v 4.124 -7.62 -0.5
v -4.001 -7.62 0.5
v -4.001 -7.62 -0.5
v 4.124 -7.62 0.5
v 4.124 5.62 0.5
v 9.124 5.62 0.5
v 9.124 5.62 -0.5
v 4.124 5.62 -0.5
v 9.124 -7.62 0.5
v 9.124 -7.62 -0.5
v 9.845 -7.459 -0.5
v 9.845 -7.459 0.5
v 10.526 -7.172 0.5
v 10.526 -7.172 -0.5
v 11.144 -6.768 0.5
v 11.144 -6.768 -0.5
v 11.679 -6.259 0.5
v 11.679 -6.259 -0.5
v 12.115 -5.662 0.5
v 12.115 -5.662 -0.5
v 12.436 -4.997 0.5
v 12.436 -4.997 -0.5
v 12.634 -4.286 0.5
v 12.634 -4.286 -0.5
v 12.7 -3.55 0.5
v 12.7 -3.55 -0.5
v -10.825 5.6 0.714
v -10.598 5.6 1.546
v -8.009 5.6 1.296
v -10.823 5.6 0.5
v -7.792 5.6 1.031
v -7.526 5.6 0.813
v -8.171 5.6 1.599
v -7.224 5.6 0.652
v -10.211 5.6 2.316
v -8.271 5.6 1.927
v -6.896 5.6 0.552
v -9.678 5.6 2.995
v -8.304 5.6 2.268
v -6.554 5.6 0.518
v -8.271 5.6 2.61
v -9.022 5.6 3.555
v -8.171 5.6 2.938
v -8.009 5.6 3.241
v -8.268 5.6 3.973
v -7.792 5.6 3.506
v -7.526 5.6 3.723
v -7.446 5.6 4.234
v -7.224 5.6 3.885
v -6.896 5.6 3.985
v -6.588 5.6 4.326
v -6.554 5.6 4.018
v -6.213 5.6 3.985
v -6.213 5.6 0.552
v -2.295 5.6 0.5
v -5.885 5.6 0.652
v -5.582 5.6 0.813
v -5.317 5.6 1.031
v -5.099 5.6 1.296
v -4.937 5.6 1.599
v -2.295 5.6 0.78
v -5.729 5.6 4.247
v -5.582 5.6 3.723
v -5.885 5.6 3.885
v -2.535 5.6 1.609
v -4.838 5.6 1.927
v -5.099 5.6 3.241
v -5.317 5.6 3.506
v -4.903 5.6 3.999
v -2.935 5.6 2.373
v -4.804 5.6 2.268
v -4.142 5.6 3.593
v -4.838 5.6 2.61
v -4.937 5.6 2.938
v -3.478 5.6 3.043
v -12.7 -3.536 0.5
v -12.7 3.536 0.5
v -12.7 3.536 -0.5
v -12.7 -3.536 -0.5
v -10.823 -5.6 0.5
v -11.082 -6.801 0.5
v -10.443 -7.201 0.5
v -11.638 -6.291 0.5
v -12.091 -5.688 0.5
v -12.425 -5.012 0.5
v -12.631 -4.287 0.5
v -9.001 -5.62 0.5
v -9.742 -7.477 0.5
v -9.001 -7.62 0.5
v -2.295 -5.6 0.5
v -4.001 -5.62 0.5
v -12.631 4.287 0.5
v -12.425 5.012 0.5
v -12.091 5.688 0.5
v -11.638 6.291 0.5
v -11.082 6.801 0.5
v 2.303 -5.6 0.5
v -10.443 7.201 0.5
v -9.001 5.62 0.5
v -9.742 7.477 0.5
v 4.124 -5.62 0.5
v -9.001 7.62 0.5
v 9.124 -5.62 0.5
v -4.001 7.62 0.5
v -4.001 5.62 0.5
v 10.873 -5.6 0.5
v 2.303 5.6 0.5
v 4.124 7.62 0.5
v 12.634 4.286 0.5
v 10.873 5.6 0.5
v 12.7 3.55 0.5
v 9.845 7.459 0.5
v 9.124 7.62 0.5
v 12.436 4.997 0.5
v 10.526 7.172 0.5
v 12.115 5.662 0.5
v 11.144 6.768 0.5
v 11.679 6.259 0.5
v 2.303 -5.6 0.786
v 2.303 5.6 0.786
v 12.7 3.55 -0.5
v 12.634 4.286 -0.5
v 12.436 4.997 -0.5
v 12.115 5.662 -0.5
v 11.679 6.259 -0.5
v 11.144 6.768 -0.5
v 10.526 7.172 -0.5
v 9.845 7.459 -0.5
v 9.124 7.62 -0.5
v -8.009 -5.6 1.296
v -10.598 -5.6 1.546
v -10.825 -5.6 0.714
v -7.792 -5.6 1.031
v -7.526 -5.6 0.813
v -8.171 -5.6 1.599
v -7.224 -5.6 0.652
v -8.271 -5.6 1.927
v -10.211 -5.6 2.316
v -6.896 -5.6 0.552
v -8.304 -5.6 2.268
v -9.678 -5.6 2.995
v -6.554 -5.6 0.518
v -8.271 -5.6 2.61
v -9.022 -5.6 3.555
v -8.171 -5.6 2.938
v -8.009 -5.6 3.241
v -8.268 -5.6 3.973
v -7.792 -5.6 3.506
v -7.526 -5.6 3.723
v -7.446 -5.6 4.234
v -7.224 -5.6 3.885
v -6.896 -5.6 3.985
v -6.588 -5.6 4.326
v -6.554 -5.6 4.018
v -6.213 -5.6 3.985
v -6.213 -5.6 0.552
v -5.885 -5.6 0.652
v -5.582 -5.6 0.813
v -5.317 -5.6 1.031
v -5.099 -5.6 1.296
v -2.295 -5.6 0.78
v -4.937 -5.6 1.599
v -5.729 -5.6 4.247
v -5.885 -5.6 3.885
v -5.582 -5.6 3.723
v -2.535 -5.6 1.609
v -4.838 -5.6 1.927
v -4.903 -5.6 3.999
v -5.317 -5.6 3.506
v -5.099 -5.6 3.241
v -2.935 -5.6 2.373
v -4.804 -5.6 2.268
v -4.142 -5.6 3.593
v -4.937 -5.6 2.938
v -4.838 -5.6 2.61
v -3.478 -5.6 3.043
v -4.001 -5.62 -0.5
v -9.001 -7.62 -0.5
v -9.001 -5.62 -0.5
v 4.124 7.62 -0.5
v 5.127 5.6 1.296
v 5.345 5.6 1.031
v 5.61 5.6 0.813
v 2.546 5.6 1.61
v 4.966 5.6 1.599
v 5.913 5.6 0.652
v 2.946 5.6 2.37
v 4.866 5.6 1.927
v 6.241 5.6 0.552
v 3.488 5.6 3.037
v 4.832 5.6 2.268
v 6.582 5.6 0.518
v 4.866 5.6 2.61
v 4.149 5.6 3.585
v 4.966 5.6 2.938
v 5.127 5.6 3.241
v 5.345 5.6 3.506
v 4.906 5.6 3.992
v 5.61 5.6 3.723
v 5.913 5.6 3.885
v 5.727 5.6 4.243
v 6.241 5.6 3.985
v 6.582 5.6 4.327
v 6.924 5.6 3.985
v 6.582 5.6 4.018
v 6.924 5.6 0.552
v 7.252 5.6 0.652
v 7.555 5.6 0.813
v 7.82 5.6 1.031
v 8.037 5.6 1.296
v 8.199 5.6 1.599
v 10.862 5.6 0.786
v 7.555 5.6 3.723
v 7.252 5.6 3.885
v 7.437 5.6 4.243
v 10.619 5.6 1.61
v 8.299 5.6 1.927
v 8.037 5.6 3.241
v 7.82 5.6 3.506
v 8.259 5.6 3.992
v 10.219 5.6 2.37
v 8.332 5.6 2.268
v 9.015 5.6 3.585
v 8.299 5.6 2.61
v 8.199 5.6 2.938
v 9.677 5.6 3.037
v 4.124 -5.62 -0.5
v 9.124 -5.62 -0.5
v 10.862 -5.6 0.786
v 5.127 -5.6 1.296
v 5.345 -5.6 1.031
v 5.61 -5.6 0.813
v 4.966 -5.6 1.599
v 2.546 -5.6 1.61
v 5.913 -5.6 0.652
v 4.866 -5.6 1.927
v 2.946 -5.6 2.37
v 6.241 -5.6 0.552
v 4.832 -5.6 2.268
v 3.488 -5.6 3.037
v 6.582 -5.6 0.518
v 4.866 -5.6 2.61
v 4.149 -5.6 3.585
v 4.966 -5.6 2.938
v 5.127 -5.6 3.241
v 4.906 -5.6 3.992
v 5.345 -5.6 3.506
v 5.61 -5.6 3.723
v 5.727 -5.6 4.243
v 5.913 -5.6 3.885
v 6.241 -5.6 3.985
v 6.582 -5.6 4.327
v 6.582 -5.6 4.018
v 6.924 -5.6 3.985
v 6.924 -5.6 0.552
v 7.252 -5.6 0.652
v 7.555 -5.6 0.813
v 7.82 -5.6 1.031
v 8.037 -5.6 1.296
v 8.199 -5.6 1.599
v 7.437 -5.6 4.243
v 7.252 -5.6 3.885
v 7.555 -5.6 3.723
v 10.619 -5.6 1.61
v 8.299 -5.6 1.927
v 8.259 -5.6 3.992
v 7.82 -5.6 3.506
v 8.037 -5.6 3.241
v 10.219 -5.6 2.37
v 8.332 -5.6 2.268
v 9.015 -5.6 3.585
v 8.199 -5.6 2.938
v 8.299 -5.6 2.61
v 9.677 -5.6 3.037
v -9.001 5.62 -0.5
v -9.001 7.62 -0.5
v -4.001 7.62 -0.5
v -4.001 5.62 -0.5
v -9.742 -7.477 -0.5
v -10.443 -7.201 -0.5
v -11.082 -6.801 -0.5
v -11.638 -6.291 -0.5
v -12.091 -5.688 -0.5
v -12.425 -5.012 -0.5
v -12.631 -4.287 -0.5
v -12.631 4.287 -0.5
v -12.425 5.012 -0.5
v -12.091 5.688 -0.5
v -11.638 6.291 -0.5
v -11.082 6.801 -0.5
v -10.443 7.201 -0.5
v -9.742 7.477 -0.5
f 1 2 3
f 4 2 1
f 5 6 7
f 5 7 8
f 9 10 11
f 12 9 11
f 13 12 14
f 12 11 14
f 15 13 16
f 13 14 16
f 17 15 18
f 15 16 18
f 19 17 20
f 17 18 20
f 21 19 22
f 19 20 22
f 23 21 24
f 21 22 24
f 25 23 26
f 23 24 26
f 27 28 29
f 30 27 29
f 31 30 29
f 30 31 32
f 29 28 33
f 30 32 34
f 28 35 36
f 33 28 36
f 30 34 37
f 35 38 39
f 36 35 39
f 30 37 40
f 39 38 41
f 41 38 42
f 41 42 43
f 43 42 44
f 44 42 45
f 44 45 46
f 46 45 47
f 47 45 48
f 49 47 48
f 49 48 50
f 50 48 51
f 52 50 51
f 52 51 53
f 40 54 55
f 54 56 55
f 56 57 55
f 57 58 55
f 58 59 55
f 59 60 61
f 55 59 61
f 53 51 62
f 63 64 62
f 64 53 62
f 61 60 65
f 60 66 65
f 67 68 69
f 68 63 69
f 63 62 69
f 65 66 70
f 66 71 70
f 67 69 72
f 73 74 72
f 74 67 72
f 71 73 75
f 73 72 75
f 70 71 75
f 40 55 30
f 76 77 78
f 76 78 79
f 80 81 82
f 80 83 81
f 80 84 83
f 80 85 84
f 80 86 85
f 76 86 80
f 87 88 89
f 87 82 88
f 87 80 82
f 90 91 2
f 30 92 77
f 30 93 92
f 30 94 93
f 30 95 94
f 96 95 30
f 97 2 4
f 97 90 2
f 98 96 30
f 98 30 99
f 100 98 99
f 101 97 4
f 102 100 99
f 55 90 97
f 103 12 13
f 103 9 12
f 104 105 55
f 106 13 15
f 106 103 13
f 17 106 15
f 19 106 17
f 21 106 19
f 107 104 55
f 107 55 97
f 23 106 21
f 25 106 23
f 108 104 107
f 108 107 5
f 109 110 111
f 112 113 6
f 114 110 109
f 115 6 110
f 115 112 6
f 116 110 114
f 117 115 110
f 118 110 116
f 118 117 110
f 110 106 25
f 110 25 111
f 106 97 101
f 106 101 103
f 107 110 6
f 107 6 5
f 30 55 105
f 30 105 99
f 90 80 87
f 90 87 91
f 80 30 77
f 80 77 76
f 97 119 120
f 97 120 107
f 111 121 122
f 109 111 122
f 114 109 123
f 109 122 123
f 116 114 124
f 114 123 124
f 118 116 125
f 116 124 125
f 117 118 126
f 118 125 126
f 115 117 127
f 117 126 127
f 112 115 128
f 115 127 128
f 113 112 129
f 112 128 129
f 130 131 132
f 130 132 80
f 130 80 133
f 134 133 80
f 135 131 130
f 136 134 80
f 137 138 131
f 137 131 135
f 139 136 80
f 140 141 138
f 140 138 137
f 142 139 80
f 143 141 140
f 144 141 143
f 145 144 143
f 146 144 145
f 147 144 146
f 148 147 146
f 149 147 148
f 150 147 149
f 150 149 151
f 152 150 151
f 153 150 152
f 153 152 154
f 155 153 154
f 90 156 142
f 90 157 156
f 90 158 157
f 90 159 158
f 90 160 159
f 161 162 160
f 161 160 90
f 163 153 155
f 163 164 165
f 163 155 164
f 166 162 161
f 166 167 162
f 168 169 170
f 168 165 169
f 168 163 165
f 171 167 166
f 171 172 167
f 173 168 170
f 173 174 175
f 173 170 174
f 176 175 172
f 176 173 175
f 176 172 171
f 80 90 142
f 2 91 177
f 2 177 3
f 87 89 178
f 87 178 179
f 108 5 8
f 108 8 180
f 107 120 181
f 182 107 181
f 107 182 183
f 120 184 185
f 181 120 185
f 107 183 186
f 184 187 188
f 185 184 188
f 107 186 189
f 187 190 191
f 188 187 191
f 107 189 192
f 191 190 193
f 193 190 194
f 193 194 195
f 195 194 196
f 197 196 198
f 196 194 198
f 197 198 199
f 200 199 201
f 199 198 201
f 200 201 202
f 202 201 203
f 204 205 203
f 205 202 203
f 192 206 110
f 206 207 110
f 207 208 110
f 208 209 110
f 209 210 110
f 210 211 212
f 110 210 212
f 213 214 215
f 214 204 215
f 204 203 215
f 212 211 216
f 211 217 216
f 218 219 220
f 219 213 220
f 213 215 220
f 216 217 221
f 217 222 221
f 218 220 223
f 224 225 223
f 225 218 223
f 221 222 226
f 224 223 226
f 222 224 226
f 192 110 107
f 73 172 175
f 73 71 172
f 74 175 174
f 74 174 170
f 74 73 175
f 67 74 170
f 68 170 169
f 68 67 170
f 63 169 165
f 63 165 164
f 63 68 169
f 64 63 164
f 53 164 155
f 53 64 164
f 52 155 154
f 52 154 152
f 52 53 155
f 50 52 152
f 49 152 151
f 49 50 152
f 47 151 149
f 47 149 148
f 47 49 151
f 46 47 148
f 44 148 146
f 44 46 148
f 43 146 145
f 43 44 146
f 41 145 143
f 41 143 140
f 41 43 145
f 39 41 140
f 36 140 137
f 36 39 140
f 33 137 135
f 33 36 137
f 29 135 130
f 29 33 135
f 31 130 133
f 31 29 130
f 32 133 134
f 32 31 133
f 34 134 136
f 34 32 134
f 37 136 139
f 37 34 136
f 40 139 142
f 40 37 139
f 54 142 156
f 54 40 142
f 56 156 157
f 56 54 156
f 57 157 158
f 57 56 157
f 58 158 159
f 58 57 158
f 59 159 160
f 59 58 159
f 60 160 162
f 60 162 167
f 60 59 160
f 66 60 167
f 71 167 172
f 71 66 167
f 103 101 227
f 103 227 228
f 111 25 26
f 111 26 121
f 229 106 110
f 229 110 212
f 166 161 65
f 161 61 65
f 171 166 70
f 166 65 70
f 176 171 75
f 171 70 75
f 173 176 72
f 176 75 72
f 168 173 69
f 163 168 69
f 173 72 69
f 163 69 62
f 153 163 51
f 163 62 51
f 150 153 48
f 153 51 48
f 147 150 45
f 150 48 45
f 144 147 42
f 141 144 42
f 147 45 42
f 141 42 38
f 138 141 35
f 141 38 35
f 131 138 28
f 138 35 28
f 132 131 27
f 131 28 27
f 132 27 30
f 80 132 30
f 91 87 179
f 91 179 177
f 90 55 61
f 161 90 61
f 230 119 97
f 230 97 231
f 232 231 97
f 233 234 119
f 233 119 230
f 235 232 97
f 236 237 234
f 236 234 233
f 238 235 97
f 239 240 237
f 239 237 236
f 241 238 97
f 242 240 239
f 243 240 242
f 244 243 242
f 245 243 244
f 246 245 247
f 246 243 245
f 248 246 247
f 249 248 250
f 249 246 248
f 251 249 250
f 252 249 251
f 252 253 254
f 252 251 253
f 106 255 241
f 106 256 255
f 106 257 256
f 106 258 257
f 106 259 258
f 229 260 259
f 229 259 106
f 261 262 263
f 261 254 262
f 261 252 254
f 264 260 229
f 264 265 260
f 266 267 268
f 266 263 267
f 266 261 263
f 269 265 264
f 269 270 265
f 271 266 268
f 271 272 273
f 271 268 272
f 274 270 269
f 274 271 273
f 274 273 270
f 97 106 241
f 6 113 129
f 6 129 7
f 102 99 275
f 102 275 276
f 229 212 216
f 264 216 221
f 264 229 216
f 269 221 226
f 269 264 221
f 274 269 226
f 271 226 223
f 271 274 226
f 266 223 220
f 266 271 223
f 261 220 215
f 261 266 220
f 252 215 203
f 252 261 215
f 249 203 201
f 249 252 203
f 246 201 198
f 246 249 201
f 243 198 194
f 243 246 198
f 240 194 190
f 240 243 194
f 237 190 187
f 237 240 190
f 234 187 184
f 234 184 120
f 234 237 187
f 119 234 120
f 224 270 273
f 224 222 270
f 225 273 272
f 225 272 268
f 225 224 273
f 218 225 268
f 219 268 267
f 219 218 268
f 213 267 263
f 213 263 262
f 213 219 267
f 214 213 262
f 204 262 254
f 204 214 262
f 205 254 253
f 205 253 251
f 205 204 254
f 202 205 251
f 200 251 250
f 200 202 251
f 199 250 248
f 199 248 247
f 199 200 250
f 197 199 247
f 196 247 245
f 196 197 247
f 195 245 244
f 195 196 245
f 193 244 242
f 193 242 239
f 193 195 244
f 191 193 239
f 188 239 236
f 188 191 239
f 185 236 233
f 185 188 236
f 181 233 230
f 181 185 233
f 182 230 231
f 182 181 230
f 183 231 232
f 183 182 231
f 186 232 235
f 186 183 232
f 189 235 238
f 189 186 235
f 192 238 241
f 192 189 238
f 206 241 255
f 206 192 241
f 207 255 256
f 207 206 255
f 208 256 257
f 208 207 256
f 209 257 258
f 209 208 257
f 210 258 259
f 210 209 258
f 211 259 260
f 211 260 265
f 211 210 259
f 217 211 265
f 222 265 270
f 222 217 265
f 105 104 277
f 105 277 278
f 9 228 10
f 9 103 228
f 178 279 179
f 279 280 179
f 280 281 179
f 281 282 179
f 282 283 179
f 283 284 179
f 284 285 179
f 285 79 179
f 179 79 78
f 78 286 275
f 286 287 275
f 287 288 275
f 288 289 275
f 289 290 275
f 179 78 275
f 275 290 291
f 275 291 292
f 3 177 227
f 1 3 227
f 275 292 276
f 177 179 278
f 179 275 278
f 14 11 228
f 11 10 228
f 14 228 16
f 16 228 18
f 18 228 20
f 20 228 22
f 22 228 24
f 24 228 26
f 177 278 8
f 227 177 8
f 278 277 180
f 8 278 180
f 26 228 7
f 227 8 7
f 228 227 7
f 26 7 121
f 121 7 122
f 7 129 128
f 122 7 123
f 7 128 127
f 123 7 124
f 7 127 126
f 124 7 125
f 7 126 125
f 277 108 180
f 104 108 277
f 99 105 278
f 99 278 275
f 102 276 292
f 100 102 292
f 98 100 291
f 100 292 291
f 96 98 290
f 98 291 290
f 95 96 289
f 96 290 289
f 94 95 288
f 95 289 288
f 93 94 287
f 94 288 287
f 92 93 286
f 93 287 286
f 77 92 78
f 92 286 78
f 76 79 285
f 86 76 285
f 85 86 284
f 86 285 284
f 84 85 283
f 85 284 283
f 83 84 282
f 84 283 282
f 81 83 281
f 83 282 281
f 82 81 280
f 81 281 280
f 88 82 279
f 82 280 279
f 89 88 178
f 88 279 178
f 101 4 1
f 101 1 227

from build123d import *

# Parameters (mm, degrees)
F1_DEPTH    = 0.5
F2_R        = 1.75
F3_DEPTH    = 5.6
F4_T1_DEPTH = 21.3501190522
F4_T3_DEPTH = 21.4204938405


# Not quite as in the source:
# - a fillet or chamfer that OpenCascade refuses, or shapes differently, is made with other operations: its cross-section is extruded or revolved along the edge and cut away or added


with BuildPart() as f1:
    # F0 (on Top) → F1 (new body, symmetric)
    with BuildSketch(Plane.XY):
        Polygon((12.7, -7.62), (12.7, 7.62), (9.1240987852, 7.62), (9.1240987852, 5.62), (4.1240987852, 5.62), (4.1240987852, 7.62), (-4.0011659991, 7.62), (-4.0011659991, 5.62), (-9.0011659991, 5.62), (-9.0011659991, 7.62), (-12.7, 7.62), (-12.7, -7.62), (-9.0011659991, -7.62), (-9.0011659991, -5.62), (-4.0011659991, -5.62), (-4.0011659991, -7.62), (4.1240987852, -7.62), (4.1240987852, -5.62), (9.1240987852, -5.62), (9.1240987852, -7.62), align=None)
    extrude(amount=F1_DEPTH, both=True)

    # F2 (on Front) → F3 (join, symmetric)
    with BuildSketch(Plane.XZ):
        with BuildLine():
            Line((-2.2954130392, -0.004001643), (-2.2954130392, 0.7802180896))
            ThreePointArc((-2.2954130392, 0.7802180896), (-6.588071973, 4.326288954), (-10.8247913043, 0.7135685656))
            Line((-10.8247913043, 0.7135685656), (-10.8191841297, -0.004001643))
            Line((-10.8191841297, -0.004001643), (-6.5542345937, -0.004001643))
            Line((-6.5542345937, -0.004001643), (-2.2954130392, -0.004001643))
        make_face()
        with Locations((-6.5542345937, 2.2683413699)):
            Circle(F2_R, mode=Mode.SUBTRACT)
        with BuildLine():
            Line((10.8930142596, 0), (10.861883565, 0.7857921351))
            ThreePointArc((10.861883565, 0.7857921351), (6.5823484291, 4.3273176658), (2.3028132932, 0.7857921351))
            Line((2.3028132932, 0.7857921351), (2.3028132932, 0))
            Line((2.3028132932, 0), (10.8930142596, 0))
        make_face()
        with Locations((6.5823484291, 2.2683413699)):
            Circle(F2_R, mode=Mode.SUBTRACT)
    extrude(amount=F3_DEPTH, both=True)

    # F4: fillet of radius 4.104163056 on 4 edges, made by hand

    # F4_s2 → F4_t1 (cut)
    with BuildSketch(Plane.XY.offset(-10.6750595261)):
        with BuildLine():
            ThreePointArc((9.1240987852, -7.62), (11.6790355366, -6.2588580306), (12.7, -3.5499761896))
            Line((12.7, -3.5499761896), (12.7, -7.62))
            Line((12.7, -7.62), (9.1240987852, -7.62))
        make_face()
        with BuildLine():
            ThreePointArc((12.7, 3.5499761896), (11.6790355366, 6.2588580306), (9.1240987852, 7.62))
            Line((9.1240987852, 7.62), (12.7, 7.62))
            Line((12.7, 7.62), (12.7, 3.5499761896))
        make_face()
    extrude(amount=F4_T1_DEPTH, mode=Mode.SUBTRACT)

    # F4_s4 → F4_t3 (cut)
    with BuildSketch(Plane.XY.offset(-10.7102469202)):
        with BuildLine():
            ThreePointArc((-9.0011659991, 7.62), (-11.6378503335, 6.2909527611), (-12.7, 3.5359012319))
            Line((-12.7, 3.5359012319), (-12.7, 7.62))
            Line((-12.7, 7.62), (-9.0011659991, 7.62))
        make_face()
        with BuildLine():
            ThreePointArc((-12.7, -3.5359012319), (-11.6378503335, -6.2909527611), (-9.0011659991, -7.62))
            Line((-9.0011659991, -7.62), (-12.7, -7.62))
            Line((-12.7, -7.62), (-12.7, -3.5359012319))
        make_face()
    extrude(amount=F4_T3_DEPTH, mode=Mode.SUBTRACT)


solid = f1.part
